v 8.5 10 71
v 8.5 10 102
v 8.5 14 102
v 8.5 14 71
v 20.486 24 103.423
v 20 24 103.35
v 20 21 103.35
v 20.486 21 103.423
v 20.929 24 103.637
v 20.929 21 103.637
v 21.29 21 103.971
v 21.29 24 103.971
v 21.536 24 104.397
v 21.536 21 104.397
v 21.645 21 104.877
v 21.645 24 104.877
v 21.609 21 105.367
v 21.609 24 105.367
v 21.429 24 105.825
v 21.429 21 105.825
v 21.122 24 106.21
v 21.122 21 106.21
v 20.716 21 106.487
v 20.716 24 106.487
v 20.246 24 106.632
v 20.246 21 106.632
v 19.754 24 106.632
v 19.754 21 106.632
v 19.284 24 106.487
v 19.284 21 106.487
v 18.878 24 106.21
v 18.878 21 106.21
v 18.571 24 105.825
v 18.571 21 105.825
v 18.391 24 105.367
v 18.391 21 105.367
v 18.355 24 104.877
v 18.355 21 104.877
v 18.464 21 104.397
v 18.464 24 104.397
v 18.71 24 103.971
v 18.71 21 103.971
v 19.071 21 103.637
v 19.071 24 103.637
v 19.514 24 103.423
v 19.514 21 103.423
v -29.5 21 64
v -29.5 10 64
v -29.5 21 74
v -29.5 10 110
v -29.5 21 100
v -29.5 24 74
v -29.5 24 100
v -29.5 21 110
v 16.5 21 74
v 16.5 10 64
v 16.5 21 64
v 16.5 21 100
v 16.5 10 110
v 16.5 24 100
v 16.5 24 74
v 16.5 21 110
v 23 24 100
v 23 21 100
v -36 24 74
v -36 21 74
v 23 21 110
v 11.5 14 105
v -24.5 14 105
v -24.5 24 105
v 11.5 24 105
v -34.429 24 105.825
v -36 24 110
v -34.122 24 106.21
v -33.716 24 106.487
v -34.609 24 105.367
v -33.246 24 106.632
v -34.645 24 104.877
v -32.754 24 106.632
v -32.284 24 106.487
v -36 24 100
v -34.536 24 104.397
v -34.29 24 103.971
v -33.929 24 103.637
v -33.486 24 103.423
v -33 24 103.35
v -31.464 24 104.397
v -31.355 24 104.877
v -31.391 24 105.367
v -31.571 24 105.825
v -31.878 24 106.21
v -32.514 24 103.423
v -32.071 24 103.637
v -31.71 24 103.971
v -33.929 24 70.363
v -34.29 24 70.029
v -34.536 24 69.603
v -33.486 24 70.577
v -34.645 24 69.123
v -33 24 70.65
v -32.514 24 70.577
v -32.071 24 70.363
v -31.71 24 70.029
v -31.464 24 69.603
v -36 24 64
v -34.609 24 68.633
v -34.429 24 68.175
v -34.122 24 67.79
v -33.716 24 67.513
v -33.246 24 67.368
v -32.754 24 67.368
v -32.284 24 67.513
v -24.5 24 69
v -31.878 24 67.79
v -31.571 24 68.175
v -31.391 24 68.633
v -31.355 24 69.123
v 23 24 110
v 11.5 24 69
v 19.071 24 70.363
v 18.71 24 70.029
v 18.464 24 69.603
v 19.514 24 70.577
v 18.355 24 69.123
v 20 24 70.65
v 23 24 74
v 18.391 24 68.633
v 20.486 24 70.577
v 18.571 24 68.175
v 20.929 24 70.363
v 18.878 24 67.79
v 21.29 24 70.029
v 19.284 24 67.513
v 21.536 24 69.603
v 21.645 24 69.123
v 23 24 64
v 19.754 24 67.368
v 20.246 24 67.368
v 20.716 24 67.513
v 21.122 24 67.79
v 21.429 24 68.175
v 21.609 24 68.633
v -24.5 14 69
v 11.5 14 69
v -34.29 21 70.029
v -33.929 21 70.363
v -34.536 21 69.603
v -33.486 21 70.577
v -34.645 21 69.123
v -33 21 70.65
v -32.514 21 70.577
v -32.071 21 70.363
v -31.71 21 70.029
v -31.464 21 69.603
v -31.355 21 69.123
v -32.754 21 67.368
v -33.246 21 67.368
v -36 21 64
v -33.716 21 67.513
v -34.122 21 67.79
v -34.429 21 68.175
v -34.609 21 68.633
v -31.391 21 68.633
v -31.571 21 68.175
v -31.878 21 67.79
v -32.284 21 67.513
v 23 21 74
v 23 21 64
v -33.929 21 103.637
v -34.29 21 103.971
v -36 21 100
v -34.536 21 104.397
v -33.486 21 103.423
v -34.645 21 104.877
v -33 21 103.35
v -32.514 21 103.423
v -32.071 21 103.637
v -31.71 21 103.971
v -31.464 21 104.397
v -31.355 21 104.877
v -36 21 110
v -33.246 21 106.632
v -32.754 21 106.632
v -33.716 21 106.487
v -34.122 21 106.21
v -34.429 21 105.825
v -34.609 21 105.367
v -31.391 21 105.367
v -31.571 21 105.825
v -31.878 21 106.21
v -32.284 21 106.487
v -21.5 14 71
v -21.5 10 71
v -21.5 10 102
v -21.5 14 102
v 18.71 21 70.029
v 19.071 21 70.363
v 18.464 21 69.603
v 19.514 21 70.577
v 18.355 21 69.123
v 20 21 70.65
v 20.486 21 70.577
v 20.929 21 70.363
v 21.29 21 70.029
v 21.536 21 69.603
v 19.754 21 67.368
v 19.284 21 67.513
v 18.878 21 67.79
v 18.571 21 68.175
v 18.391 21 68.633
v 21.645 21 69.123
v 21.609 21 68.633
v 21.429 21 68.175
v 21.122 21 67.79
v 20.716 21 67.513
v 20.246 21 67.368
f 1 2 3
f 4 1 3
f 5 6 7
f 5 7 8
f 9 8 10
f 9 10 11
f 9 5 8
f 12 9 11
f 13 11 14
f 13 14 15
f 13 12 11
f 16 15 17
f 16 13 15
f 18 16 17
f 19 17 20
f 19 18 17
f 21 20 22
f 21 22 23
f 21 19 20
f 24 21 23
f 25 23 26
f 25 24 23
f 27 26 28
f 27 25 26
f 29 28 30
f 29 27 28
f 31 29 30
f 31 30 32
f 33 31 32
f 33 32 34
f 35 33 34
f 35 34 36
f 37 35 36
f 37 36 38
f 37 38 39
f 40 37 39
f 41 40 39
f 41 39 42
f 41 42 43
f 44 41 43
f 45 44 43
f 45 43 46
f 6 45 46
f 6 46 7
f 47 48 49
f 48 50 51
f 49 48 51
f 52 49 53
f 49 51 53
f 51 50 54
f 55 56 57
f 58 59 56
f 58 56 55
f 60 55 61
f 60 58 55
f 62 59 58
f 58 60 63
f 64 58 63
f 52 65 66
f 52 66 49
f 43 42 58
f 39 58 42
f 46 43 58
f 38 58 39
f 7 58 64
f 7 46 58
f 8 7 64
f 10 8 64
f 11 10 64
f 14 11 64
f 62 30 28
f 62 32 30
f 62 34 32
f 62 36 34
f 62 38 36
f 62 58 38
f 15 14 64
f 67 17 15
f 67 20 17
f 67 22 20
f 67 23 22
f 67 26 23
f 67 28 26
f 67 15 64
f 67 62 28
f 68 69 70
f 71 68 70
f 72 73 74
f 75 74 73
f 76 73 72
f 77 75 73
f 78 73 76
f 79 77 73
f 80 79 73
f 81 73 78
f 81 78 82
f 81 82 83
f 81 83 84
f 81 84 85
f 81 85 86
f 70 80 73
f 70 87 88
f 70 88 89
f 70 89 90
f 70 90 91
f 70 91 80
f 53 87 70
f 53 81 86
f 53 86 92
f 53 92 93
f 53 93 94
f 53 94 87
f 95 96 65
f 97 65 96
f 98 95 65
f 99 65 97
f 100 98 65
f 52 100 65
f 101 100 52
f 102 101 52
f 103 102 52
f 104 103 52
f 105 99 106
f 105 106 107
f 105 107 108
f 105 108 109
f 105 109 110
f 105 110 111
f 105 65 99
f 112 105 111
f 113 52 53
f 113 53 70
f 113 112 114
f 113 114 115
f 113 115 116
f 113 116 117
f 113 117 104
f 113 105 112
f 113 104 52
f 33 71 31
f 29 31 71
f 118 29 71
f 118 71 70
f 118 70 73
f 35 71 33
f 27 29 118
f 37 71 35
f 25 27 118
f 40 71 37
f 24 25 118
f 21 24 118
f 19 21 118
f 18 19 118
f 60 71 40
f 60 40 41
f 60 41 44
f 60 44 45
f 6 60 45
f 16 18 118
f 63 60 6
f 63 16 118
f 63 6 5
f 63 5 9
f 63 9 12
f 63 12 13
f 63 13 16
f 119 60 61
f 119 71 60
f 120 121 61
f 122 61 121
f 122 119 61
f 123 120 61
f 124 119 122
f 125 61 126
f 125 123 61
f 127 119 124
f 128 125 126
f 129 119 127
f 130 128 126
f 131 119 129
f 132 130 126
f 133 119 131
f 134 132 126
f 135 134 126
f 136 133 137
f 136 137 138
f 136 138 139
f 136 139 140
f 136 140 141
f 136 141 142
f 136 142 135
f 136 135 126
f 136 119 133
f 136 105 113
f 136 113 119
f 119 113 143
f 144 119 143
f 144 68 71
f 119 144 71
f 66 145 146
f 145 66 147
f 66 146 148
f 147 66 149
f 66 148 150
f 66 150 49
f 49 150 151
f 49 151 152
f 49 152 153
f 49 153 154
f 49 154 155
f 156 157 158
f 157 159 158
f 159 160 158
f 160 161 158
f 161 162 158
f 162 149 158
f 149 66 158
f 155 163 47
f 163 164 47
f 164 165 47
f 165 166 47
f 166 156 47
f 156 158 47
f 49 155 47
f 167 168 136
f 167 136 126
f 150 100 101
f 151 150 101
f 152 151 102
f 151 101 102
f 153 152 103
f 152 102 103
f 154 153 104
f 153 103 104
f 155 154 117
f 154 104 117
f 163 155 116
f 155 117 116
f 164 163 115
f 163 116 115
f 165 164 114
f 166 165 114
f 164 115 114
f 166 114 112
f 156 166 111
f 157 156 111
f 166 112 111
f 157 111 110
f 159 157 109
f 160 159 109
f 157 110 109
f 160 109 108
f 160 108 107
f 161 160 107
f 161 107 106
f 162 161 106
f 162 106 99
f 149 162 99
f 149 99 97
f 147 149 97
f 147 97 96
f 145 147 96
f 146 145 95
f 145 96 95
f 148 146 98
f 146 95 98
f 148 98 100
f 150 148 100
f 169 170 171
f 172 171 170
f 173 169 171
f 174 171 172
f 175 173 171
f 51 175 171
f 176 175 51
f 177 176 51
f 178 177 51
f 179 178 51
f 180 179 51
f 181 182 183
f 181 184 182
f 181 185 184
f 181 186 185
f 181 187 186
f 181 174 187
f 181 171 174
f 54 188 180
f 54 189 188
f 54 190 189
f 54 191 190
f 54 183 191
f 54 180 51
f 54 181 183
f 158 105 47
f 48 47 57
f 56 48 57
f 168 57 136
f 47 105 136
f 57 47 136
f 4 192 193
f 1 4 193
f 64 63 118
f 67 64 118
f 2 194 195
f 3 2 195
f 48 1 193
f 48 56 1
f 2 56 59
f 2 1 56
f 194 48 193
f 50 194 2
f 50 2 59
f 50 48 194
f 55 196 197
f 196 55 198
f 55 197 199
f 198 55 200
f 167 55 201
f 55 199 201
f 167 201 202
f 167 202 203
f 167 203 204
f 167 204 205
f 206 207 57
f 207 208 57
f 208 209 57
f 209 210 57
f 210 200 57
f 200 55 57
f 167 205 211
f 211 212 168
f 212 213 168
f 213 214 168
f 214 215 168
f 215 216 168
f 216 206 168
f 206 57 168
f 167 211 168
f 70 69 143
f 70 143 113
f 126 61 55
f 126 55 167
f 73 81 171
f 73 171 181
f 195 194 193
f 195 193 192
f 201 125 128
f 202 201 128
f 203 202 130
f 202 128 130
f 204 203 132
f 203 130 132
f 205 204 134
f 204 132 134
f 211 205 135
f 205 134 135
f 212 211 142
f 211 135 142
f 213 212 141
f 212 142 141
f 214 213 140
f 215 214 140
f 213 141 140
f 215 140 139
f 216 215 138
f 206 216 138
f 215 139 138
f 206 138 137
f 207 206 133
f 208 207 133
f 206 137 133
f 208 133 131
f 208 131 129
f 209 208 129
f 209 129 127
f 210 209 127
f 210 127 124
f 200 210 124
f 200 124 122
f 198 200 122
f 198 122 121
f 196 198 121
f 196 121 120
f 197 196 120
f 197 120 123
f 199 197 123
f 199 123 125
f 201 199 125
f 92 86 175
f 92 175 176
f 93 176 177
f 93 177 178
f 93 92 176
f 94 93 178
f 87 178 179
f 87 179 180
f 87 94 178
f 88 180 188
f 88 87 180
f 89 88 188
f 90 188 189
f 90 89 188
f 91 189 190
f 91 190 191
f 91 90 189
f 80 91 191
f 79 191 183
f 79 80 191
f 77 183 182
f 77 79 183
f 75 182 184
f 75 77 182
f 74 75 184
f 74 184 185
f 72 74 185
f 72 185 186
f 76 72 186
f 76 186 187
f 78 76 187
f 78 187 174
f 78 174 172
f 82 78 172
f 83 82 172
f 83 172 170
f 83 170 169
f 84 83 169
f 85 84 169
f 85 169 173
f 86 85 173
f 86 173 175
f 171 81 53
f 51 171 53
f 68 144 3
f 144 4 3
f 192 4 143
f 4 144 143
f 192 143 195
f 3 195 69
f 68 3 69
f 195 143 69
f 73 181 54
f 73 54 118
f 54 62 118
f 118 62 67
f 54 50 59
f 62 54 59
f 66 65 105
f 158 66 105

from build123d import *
from build123d.topology import SkipClean

# Parameters (mm, degrees)
SKETCH_1_W                 = 21
SKETCH_1_H                 = 20
EXTRUDE_1_DEPTH            = 4
SKETCH_2_R                 = 1.65
CUT_EXTRUDE_1_DEPTH        = 4
FILLET_1_R                 = 5
SKETCH_4_W                 = 44
SKETCH_4_H                 = 3
EXTRUDE_2_DEPTH            = 7
EXTRUDE_3_DEPTH            = 110
SKETCH_7_R                 = 1.5
CUT_EXTRUDE_3_DEPTH        = 93
CUT_EXTRUDE_4_DEPTH        = 93
SKETCH_18_W                = 8.046739473
SKETCH_18_H                = 3.477045647
CUT_EXTRUDE_5_DEPTH        = 10
EXTRUDE_START              = 1
SKETCH_21_R                = 1.5
EXTRUDE_4_DEPTH            = 1
SKETCH_27_W                = 38
SKETCH_27_H                = 4
EXTRUDE_9_DEPTH            = 1
FILLET_4_R                 = 0.5
EXTRUDE_START_2            = -4
SKETCH_28_R                = 1.5
EXTRUDE_10_DEPTH           = 4
SKETCH_30_W                = 6
SKETCH_30_H                = 110.5
EXTRUDE_11_DEPTH           = 4
SKETCH_31_W                = 50
SKETCH_31_H                = 4
CUT_EXTRUDE_6_DEPTH        = 5
SKETCH_32_W                = 30
SKETCH_32_H                = 31
CUT_EXTRUDE_7_DEPTH        = 15
SKETCH_33_W                = 23.953260528
SKETCH_33_H                = 6
EXTRUDE_12_DEPTH           = 4
SKETCH_34_W                = 46
SKETCH_34_H                = 46
SKETCH_34_W_2              = 36
SKETCH_34_H_2              = 36
EXTRUDE_1_2_DEPTH          = 10
SKETCH_36_W                = 6
SKETCH_36_H                = 6
EXTRUDE_13_DEPTH           = 4
SKETCH_37_R                = 1.7
CUT_EXTRUDE_8_DEPTH        = 10
FILLET_6_R                 = 1
SKETCH_38_W                = 10
SKETCH_38_H                = 5
CUT_EXTRUDE_9_DEPTH        = 10
SKETCH_39_W                = 7.314348503
SKETCH_39_H                = 1
SKETCH_39_W_2              = 6.638912025
EXTRUDE_14_DEPTH           = 4
SKETCH_40_W                = 10
SKETCH_40_H                = 1
SKETCH_40_H_2              = 4
EXTRUDE_15_DEPTH           = 14
SPLIT_START                = -29.5
SPLIT_BODIES_2_DEPTH       = 46
SPLIT_BODIES_2_2_DEPTH     = 5
SPLIT_START_2              = 11.5
SPLIT_BODIES_2_3_DEPTH     = 5
SPLIT_START_3              = -24.5
SPLIT_BODIES_2_4_OUTLINE_W = 4
SPLIT_BODIES_2_4_OUTLINE_H = 31
SPLIT_BODIES_2_4_DEPTH     = 3
SPLIT_START_4              = 8.5
SPLIT_BODIES_2_5_OUTLINE_W = 4
SPLIT_BODIES_2_5_OUTLINE_H = 31
SPLIT_BODIES_2_5_DEPTH     = 3
SPLIT_START_5              = -37.5
SPLIT_BODIES_2_6_OUTLINE_W = 14
SPLIT_BODIES_2_6_OUTLINE_H = 46
SPLIT_BODIES_2_6_DEPTH     = 54
SPLIT_START_6              = 10
SPLIT_BODIES_2_7_OUTLINE_R = 1.7
SPLIT_BODIES_2_7_DEPTH     = 4
SKETCH_43_W                = 5
SKETCH_43_H                = 5
SKETCH_43_W_2              = 36
EXTRUDE_16_DEPTH           = 3
SKETCH_44_W                = 6.5
SKETCH_44_H                = 10
SKETCH_44_R                = 1.65
EXTRUDE_17_DEPTH           = 3
SPLIT_START_7              = 24
SPLIT_BODIES_4_OUTLINE_W   = 59
SPLIT_BODIES_4_OUTLINE_H   = 10
SPLIT_BODIES_4_OUTLINE_R   = 1.65
SPLIT_BODIES_4_DEPTH       = 3
SPLIT_BODIES_4_2_OUTLINE_W = 59
SPLIT_BODIES_4_2_OUTLINE_H = 10
SPLIT_BODIES_4_2_OUTLINE_R = 1.65
SPLIT_BODIES_4_2_DEPTH     = 3
SPLIT_BODIES_4_3_OUTLINE_W = 59
SPLIT_BODIES_4_3_OUTLINE_H = 10
SPLIT_BODIES_4_3_OUTLINE_R = 1.65
SPLIT_BODIES_4_3_DEPTH     = 3


# Read off the part's stored shape, not the designer's step: 分割1, 分割2, 分割4
with BuildPart() as part:
    # 草图1 → Extrude 1 (new body)
    with BuildSketch(Plane.XY):
        Rectangle(SKETCH_1_W, SKETCH_1_H)
    extrude(amount=EXTRUDE_1_DEPTH)

    # 草图2 → 切除-拉伸1 (cut)
    with BuildSketch(Plane.XY.offset(4)):
        with Locations((-5, 4)):
            Circle(SKETCH_2_R)
        with Locations((5, 4)):
            Circle(SKETCH_2_R)
        with Locations((-5, -4)):
            Circle(SKETCH_2_R)
        with Locations((5, -4)):
            Circle(SKETCH_2_R)
    extrude(amount=-CUT_EXTRUDE_1_DEPTH, mode=Mode.SUBTRACT)

    # 圆角1
    fillet_1_edges = [part.edges().sort_by_distance(p)[0] for p in [
        (10.5, -10, 2),
        (-10.5, -10, 2),
    ]]
    fillet(fillet_1_edges, radius=FILLET_1_R)

    # 草图4 → 凸台-拉伸2 (add)
    with BuildSketch(Plane.XY.offset(4)):
        with Locations((-6.5, 11.5)):
            Rectangle(SKETCH_4_W, SKETCH_4_H)
    extrude(amount=-EXTRUDE_2_DEPTH)

    # 草图5 → 凸台-拉伸3 (add)
    with BuildSketch(Plane.XY.offset(4)):
        Polygon((-6.5, 13), (12.5, 13), (12.5, 10), (-25.5, 10), (-25.5, 13), align=None)
    extrude(amount=EXTRUDE_3_DEPTH)

    # 草图7 → 切除-拉伸3 (cut)
    with BuildSketch(Plane(origin=(0, 13, 0), x_dir=(1, 0, 0), z_dir=(0, 1, 0))):
        with Locations(Location((8.232, -104.79, 0), (0, 0, 270))):
            Circle(SKETCH_7_R)
        with Locations(Location((-21.232, -104.79, 0), (0, 0, 270))):
            Circle(SKETCH_7_R)
        with BuildLine():
            Line((5.476630264, -60.258900788), (5.476630264, -85.258900788))
            Line((5.476630264, -85.258900788), (5.476630264, -111))
            Line((5.476630264, -111), (-6.5, -111))
            Line((-6.5, -111), (-18.476630264, -111))
            Line((-18.476630264, -111), (-18.476630264, -85.258900788))
            Line((-18.476630264, -85.258900788), (-18.476630264, -60.258900788))
            ThreePointArc((-18.476630264, -60.258900788), (-6.5, -48.282270524), (5.476630264, -60.258900788))
        make_face()
    extrude(amount=-CUT_EXTRUDE_3_DEPTH, mode=Mode.SUBTRACT)

    # 草图12 → 切除-拉伸4 (cut)
    with BuildSketch(Plane(origin=(0, 13, 0), x_dir=(1, 0, 0), z_dir=(0, 1, 0))):
        with BuildLine():
            Line((-16.5, -11.5), (3.5, -11.5))
            ThreePointArc((3.5, -11.5), (6, -14), (3.5, -16.5))
            Line((3.5, -16.5), (-16.5, -16.5))
            ThreePointArc((-16.5, -16.5), (-19, -14), (-16.5, -11.5))
        make_face()
        with BuildLine():
            Line((-16.5, -24), (3.5, -24))
            ThreePointArc((3.5, -24), (6, -26.5), (3.5, -29))
            Line((3.5, -29), (-16.5, -29))
            ThreePointArc((-16.5, -29), (-19, -26.5), (-16.5, -24))
        make_face()
        with BuildLine():
            Line((-16.5, -34.5), (3.5, -34.5))
            ThreePointArc((3.5, -34.5), (6, -37), (3.5, -39.5))
            Line((3.5, -39.5), (-16.5, -39.5))
            ThreePointArc((-16.5, -39.5), (-19, -37), (-16.5, -34.5))
        make_face()
    extrude(amount=-CUT_EXTRUDE_4_DEPTH, mode=Mode.SUBTRACT)

    # 草图18 → 切除-拉伸5 (cut)
    with BuildSketch(Plane(origin=(0, 13, 0), x_dir=(1, 0, 0), z_dir=(0, 1, 0))):
        with Locations((5.476630263, -99.520878329)):
            Rectangle(SKETCH_18_W, SKETCH_18_H)
        with Locations((-18.476630263, -99.520878329)):
            Rectangle(SKETCH_18_W, SKETCH_18_H)
    extrude(amount=-CUT_EXTRUDE_5_DEPTH, mode=Mode.SUBTRACT)

    # 草图21 → 凸台-拉伸4 (add)
    with BuildSketch(Plane(origin=(0, 13, 0), x_dir=(1, 0, 0), z_dir=(0, 1, 0)).offset(EXTRUDE_START)):
        Polygon((12.5, -4), (15.5, -4), (15.5, 3), (-28.5, 3), (-28.5, -4), (-25.5, -4), (-25.5, -114), (12.5, -114), align=None)
        with Locations(Location((8.232, -104.79, 0), (0, 0, 270))):
            Circle(SKETCH_21_R, mode=Mode.SUBTRACT)
        with Locations(Location((-21.232, -104.79, 0), (0, 0, 270))):
            Circle(SKETCH_21_R, mode=Mode.SUBTRACT)
        with BuildLine():
            Line((9.5, -97.782355505), (5.476630264, -97.782355505))
            Line((5.476630264, -97.782355505), (5.476630264, -60.258900788))
            ThreePointArc((5.476630264, -60.258900788), (-6.5, -48.282270524), (-18.476630264, -60.258900788))
            Line((-18.476630264, -60.258900788), (-18.476630264, -97.782355505))
            Line((-18.476630264, -97.782355505), (-22.5, -97.782355505))
            Line((-22.5, -97.782355505), (-22.5, -101.259401152))
            Line((-22.5, -101.259401152), (-18.476630264, -101.259401152))
            Line((-18.476630264, -101.259401152), (-18.476630264, -111))
            Line((-18.476630264, -111), (5.476630264, -111))
            Line((5.476630264, -111), (5.476630264, -101.259401152))
            Line((5.476630264, -101.259401152), (9.5, -101.259401152))
            Line((9.5, -101.259401152), (9.5, -97.782355505))
        make_face(mode=Mode.SUBTRACT)
        with BuildLine():
            Line((-16.5, -39.5), (3.5, -39.5))
            ThreePointArc((3.5, -39.5), (6, -37), (3.5, -34.5))
            Line((3.5, -34.5), (-16.5, -34.5))
            ThreePointArc((-16.5, -34.5), (-19, -37), (-16.5, -39.5))
        make_face(mode=Mode.SUBTRACT)
        with BuildLine():
            Line((-16.5, -29), (3.5, -29))
            ThreePointArc((3.5, -29), (6, -26.5), (3.5, -24))
            Line((3.5, -24), (-16.5, -24))
            ThreePointArc((-16.5, -24), (-19, -26.5), (-16.5, -29))
        make_face(mode=Mode.SUBTRACT)
        with BuildLine():
            Line((-16.5, -16.5), (3.5, -16.5))
            ThreePointArc((3.5, -16.5), (6, -14), (3.5, -11.5))
            Line((3.5, -11.5), (-16.5, -11.5))
            ThreePointArc((-16.5, -11.5), (-19, -14), (-16.5, -16.5))
        make_face(mode=Mode.SUBTRACT)
    extrude(amount=-EXTRUDE_4_DEPTH)

    # 草图27 → 凸台-拉伸9 (add)
    with BuildSketch(Plane.XY.offset(114)):
        with Locations((-6.5, 12)):
            Rectangle(SKETCH_27_W, SKETCH_27_H)
    extrude(amount=EXTRUDE_9_DEPTH)

    # 圆角4
    fillet_4_edges = [part.edges().sort_by_distance(p)[0] for p in [
        (-25.5, 12, 115),
        (12.5, 12, 115),
    ]]
    fillet(fillet_4_edges, radius=FILLET_4_R)

    # 草图28 → 凸台-拉伸10 (add)
    with BuildSketch(Plane.XZ.offset(-10).offset(EXTRUDE_START_2)):
        with Locations((-21.232, 104.79)):
            Circle(SKETCH_28_R)
        with Locations((8.232, 104.79)):
            Circle(SKETCH_28_R)
        Polygon((-18.476630264, 111), (5.476630264, 111), (5.476630264, 101.259401152), (9.5, 101.259401152), (9.5, 97.782355505), (5.476630264, 97.782355505), (5.476630264, 75), (-18.476630264, 75), (-18.476630264, 97.782355505), (-22.5, 97.782355505), (-22.5, 101.259401152), (-18.476630264, 101.259401152), align=None)
    extrude(amount=EXTRUDE_10_DEPTH)

    # 草图30 → 凸台-拉伸11 (add)
    with BuildSketch(Plane(origin=(0, 14, 0), x_dir=(1, 0, 0), z_dir=(0, 1, 0))):
        with Locations((-28.5, -59.25)):
            Rectangle(SKETCH_30_W, SKETCH_30_H)
        with Locations((15.5, -59.25)):
            Rectangle(SKETCH_30_W, SKETCH_30_H)
    extrude(amount=-EXTRUDE_11_DEPTH)

    # 草图31 → 切除-拉伸6 (cut)
    with BuildSketch(Plane.XY.offset(115)):
        with Locations((-6.5, 12)):
            Rectangle(SKETCH_31_W, SKETCH_31_H)
    extrude(amount=-CUT_EXTRUDE_6_DEPTH, mode=Mode.SUBTRACT)

    # 草图32 → 切除-拉伸7 (cut)
    with BuildSketch(Plane(origin=(0, 14, 0), x_dir=(1, 0, 0), z_dir=(0, 1, 0))):
        with Locations((-6.5, -86.5)):
            Rectangle(SKETCH_32_W, SKETCH_32_H)
    extrude(amount=-CUT_EXTRUDE_7_DEPTH, mode=Mode.SUBTRACT)

    # 草图33 → 凸台-拉伸12 (add)
    with BuildSketch(Plane(origin=(0, 14, 0), x_dir=(1, 0, 0), z_dir=(0, 1, 0))):
        with Locations((-6.5, -68)):
            Rectangle(SKETCH_33_W, SKETCH_33_H)
    extrude(amount=-EXTRUDE_12_DEPTH)

    # 草图34 → Extrude 1 2 (add)
    with BuildSketch(Plane(origin=(0, 14, 0), x_dir=(1, 0, 0), z_dir=(0, 1, 0))):
        with Locations((-6.5, -87)):
            Rectangle(SKETCH_34_W, SKETCH_34_H)
        with Locations((-6.5, -87)):
            Rectangle(SKETCH_34_W_2, SKETCH_34_H_2, mode=Mode.SUBTRACT)
    extrude(amount=EXTRUDE_1_2_DEPTH)

    # 草图36 → 凸台-拉伸13 (add)
    with BuildSketch(Plane(origin=(0, 14, 0), x_dir=(1, 0, 0), z_dir=(0, 1, 0))):
        with Locations((21.5, -76)):
            Rectangle(SKETCH_36_W, SKETCH_36_H)
        with Locations((21.5, -97)):
            Rectangle(SKETCH_36_W, SKETCH_36_H)
        with Locations((-34.5, -97)):
            Rectangle(SKETCH_36_W, SKETCH_36_H)
        with Locations((-34.5, -76)):
            Rectangle(SKETCH_36_W, SKETCH_36_H)
    extrude(amount=-EXTRUDE_13_DEPTH)

    # 草图37 → 切除-拉伸8 (cut)
    with BuildSketch(Plane(origin=(0, 14, 0), x_dir=(1, 0, 0), z_dir=(0, 1, 0))):
        with Locations(Location((21.5, -76, 0), (0, 0, 270))):
            Circle(SKETCH_37_R)
        with Locations(Location((21.5, -97, 0), (0, 0, 270))):
            Circle(SKETCH_37_R)
        with Locations(Location((-34.5, -76, 0), (0, 0, 270))):
            Circle(SKETCH_37_R)
        with Locations(Location((-34.5, -97, 0), (0, 0, 270))):
            Circle(SKETCH_37_R)
    extrude(amount=-CUT_EXTRUDE_8_DEPTH, mode=Mode.SUBTRACT)

    # 圆角6
    fillet_6_edges = [part.edges().sort_by_distance(p)[0] for p in [
        (24.5, 12, 79),
        (24.5, 12, 73),
        (24.5, 12, 100),
        (24.5, 12, 94),
        (-37.5, 12, 100),
        (-37.5, 12, 94),
        (-37.5, 12, 79),
        (-37.5, 12, 73),
    ]]
    fillet(fillet_6_edges, radius=FILLET_6_R)

    # 草图38 → 切除-拉伸9 (cut)
    with BuildSketch(Plane(origin=(0, 24, 0), x_dir=(1, 0, 0), z_dir=(0, 1, 0))):
        with Locations((-6.162281761, -66.5)):
            Rectangle(SKETCH_38_W, SKETCH_38_H)
    extrude(amount=-CUT_EXTRUDE_9_DEPTH, mode=Mode.SUBTRACT)


with BuildPart() as body_2:
    # Split Bodies 1: the piece on the far side of the plane
    add(part.part)
    split(bisect_by=Plane.XY.offset(64), keep=Keep.BOTTOM)


with BuildPart() as part_1:
    add(part.part)

    # Split Bodies 1
    split(bisect_by=Plane.XY.offset(64), keep=Keep.TOP)

    # 草图39 → 凸台-拉伸14 (add)
    with BuildSketch(Plane.XZ.offset(-14)):
        with Locations((-14.819456013, 64.5)):
            Rectangle(SKETCH_39_W, SKETCH_39_H)
        with Locations((2.157174252, 64.5)):
            Rectangle(SKETCH_39_W_2, SKETCH_39_H)
    extrude(amount=EXTRUDE_14_DEPTH)

    # 草图40 → 凸台-拉伸15 (add)
    with BuildSketch(Plane.XZ.offset(-10)):
        with Locations((-6.162281761, 64.5)):
            Rectangle(SKETCH_40_W, SKETCH_40_H)
        with Locations((-6.162281761, 67)):
            Rectangle(SKETCH_40_W, SKETCH_40_H_2)
    extrude(amount=-EXTRUDE_15_DEPTH)

    # Split Bodies 2 6 outline → Split Bodies 2 6 (cut)
    with BuildSketch(Plane.YZ.offset(SPLIT_START_5)):
        with Locations((17, 87)):
            Rectangle(SPLIT_BODIES_2_6_OUTLINE_W, SPLIT_BODIES_2_6_OUTLINE_H)
    extrude(amount=SPLIT_BODIES_2_6_DEPTH, mode=Mode.SUBTRACT)


with BuildPart() as body_2_2:
    # Split Bodies 2 outline → Split Bodies 2 (new body)
    with BuildSketch(Plane.YZ.offset(SPLIT_START)):
        Polygon((24, 69), (14, 69), (14, 71), (10, 71), (10, 64), (24, 64), align=None)
        Polygon((10, 102), (14, 102), (14, 105), (24, 105), (24, 110), (10, 110), align=None)
    extrude(amount=SPLIT_BODIES_2_DEPTH)

    # Split Bodies 2 2 outline → Split Bodies 2 2 (add)
    with BuildSketch(Plane.YZ.offset(SPLIT_START)):
        Polygon((14, 71), (14, 69), (24, 69), (24, 105), (14, 105), (14, 102), (10, 102), (10, 71), align=None)
    extrude(amount=SPLIT_BODIES_2_2_DEPTH)

    # Split Bodies 2 3 outline → Split Bodies 2 3 (add)
    with BuildSketch(Plane.YZ.offset(SPLIT_START_2)):
        Polygon((14, 71), (14, 69), (24, 69), (24, 105), (14, 105), (14, 102), (10, 102), (10, 71), align=None)
    extrude(amount=SPLIT_BODIES_2_3_DEPTH)

    # Split Bodies 2 4 outline → Split Bodies 2 4 (add)
    with BuildSketch(Plane.YZ.offset(SPLIT_START_3)):
        with Locations((12, 86.5)):
            Rectangle(SPLIT_BODIES_2_4_OUTLINE_W, SPLIT_BODIES_2_4_OUTLINE_H)
    extrude(amount=SPLIT_BODIES_2_4_DEPTH)

    # Split Bodies 2 5 outline → Split Bodies 2 5 (add)
    with BuildSketch(Plane.YZ.offset(SPLIT_START_4)):
        with Locations((12, 86.5)):
            Rectangle(SPLIT_BODIES_2_5_OUTLINE_W, SPLIT_BODIES_2_5_OUTLINE_H)
    extrude(amount=SPLIT_BODIES_2_5_DEPTH)

    # 草图43 → 凸台-拉伸16 (add)
    with BuildSketch(Plane(origin=(0, 24, 0), x_dir=(1, 0, 0), z_dir=(0, 1, 0))):
        with BuildLine():
            Line((-36, -100), (-36, -105))
            Line((-36, -105), (-34.65, -105))
            ThreePointArc((-34.65, -105), (-33, -103.35), (-31.35, -105))
            Line((-31.35, -105), (-29.5, -105))
            Line((-29.5, -105), (-29.5, -100))
            Line((-29.5, -100), (-36, -100))
        make_face()
        with BuildLine():
            Line((-36, -105), (-36, -110))
            Line((-36, -110), (-29.5, -110))
            Line((-29.5, -110), (-29.5, -105))
            Line((-29.5, -105), (-31.35, -105))
            ThreePointArc((-31.35, -105), (-33, -106.65), (-34.65, -105))
            Line((-34.65, -105), (-36, -105))
        make_face()
        Polygon((-29.5, -105), (-29.5, -110), (16.5, -110), (16.5, -105), (11.5, -105), (-24.5, -105), align=None)
        with Locations((-27, -102.5)):
            Rectangle(SKETCH_43_W, SKETCH_43_H)
        with Locations((-6.5, -102.5)):
            Rectangle(SKETCH_43_W_2, SKETCH_43_H)
        with Locations((14, -102.5)):
            Rectangle(SKETCH_43_W, SKETCH_43_H)
        with BuildLine():
            Line((16.5, -105), (16.5, -110))
            Line((16.5, -110), (23, -110))
            Line((23, -110), (23, -105))
            Line((23, -105), (21.65, -105))
            ThreePointArc((21.65, -105), (20, -106.65), (18.35, -105))
            Line((18.35, -105), (16.5, -105))
        make_face()
        with BuildLine():
            Line((16.5, -100), (16.5, -105))
            Line((16.5, -105), (18.35, -105))
            ThreePointArc((18.35, -105), (20, -103.35), (21.65, -105))
            Line((21.65, -105), (23, -105))
            Line((23, -105), (23, -100))
            Line((23, -100), (16.5, -100))
        make_face()
    extrude_16 = extrude(amount=EXTRUDE_16_DEPTH)

    # 草图44 → 凸台-拉伸17 (add)
    # profile 1 of 2: a face of its own
    with SkipClean():  # the faces are left unmerged after this step: merging them gives an invalid solid
        with BuildSketch(Plane.XZ.offset(-24)):
            with Locations((-32.75, 105)):
                Rectangle(SKETCH_44_W, SKETCH_44_H)
            with Locations(Location((-33, 105, 0), (0, 0, 270))):
                Circle(SKETCH_44_R, mode=Mode.SUBTRACT)
        # profile 2 of 2: a face of its own
        with BuildSketch(Plane.XZ.offset(-24)):
            with Locations((19.75, 105)):
                Rectangle(SKETCH_44_W, SKETCH_44_H)
            with Locations(Location((20, 105, 0), (0, 0, 270))):
                Circle(SKETCH_44_R, mode=Mode.SUBTRACT)
        extrude_17 = extrude(amount=EXTRUDE_17_DEPTH)

    # 镜向2: 凸台-拉伸16, 凸台-拉伸17 across plane
    with SkipClean():  # the faces are left unmerged after this step: merging them gives an invalid solid
        add(extrude_16.mirror(Plane(origin=(0, 0, 87), x_dir=(1, 0, 0), z_dir=(0, 0, -1))))
        add(extrude_17.mirror(Plane(origin=(0, 0, 87), x_dir=(1, 0, 0), z_dir=(0, 0, -1))))
    add(body_2_2.part.scale(1), mode=Mode.REPLACE)  # the faces are merged on a copy

    # Split Bodies 4 outline → Split Bodies 4 (cut)
    # profile 1 of 2: a face of its own
    with BuildSketch(Plane(origin=(0, 0, 0), x_dir=(1, 0, 0), z_dir=(0, 1, 0)).offset(SPLIT_START_7)):
        with Locations((-6.5, -69)):
            Rectangle(SPLIT_BODIES_4_OUTLINE_W, SPLIT_BODIES_4_OUTLINE_H)
        with Locations((-33, -69)):
            Circle(SPLIT_BODIES_4_OUTLINE_R, mode=Mode.SUBTRACT)
        with Locations((20, -69)):
            Circle(SPLIT_BODIES_4_OUTLINE_R, mode=Mode.SUBTRACT)
    # profile 2 of 2: a face of its own
    with BuildSketch(Plane(origin=(0, 0, 0), x_dir=(1, 0, 0), z_dir=(0, 1, 0)).offset(SPLIT_START_7)):
        with Locations((-6.5, -105)):
            Rectangle(SPLIT_BODIES_4_OUTLINE_W, SPLIT_BODIES_4_OUTLINE_H)
        with Locations((-33, -105)):
            Circle(SPLIT_BODIES_4_OUTLINE_R, mode=Mode.SUBTRACT)
        with Locations((20, -105)):
            Circle(SPLIT_BODIES_4_OUTLINE_R, mode=Mode.SUBTRACT)
    extrude(amount=SPLIT_BODIES_4_DEPTH, mode=Mode.SUBTRACT)


with BuildPart() as body_3:
    # Split Bodies 2 7 outline → Split Bodies 2 7 (new body)
    with BuildSketch(Plane(origin=(0, 0, 0), x_dir=(1, 0, 0), z_dir=(0, 1, 0)).offset(SPLIT_START_6)):
        with BuildLine():
            Line((-29.5, -110), (-29.5, -64))
            Line((-29.5, -64), (-31.5, -64))
            Line((-31.5, -64), (-31.5, -73))
            Line((-31.5, -73), (-36.5, -73))
            ThreePointArc((-36.5, -73), (-37.207106781, -73.292893219), (-37.5, -74))
            Line((-37.5, -74), (-37.5, -78))
            ThreePointArc((-37.5, -78), (-37.207106781, -78.707106781), (-36.5, -79))
            Line((-36.5, -79), (-31.5, -79))
            Line((-31.5, -79), (-31.5, -94))
            Line((-31.5, -94), (-36.5, -94))
            ThreePointArc((-36.5, -94), (-37.207106781, -94.292893219), (-37.5, -95))
            Line((-37.5, -95), (-37.5, -99))
            ThreePointArc((-37.5, -99), (-37.207106781, -99.707106781), (-36.5, -100))
            Line((-36.5, -100), (-31.5, -100))
            Line((-31.5, -100), (-31.5, -110))
            Line((-31.5, -110), (-29.5, -110))
        make_face()
        with Locations((-34.5, -97)):
            Circle(SPLIT_BODIES_2_7_OUTLINE_R, mode=Mode.SUBTRACT)
        with Locations((-34.5, -76)):
            Circle(SPLIT_BODIES_2_7_OUTLINE_R, mode=Mode.SUBTRACT)
    extrude(amount=SPLIT_BODIES_2_7_DEPTH)


with BuildPart() as body_2_3:
    # Split Bodies 4 2 outline → Split Bodies 4 2 (new body)
    with BuildSketch(Plane(origin=(0, 0, 0), x_dir=(1, 0, 0), z_dir=(0, 1, 0)).offset(SPLIT_START_7)):
        with Locations((-6.5, -105)):
            Rectangle(SPLIT_BODIES_4_2_OUTLINE_W, SPLIT_BODIES_4_2_OUTLINE_H)
        with Locations((-33, -105)):
            Circle(SPLIT_BODIES_4_2_OUTLINE_R, mode=Mode.SUBTRACT)
        with Locations((20, -105)):
            Circle(SPLIT_BODIES_4_2_OUTLINE_R, mode=Mode.SUBTRACT)
    extrude(amount=SPLIT_BODIES_4_2_DEPTH)


with BuildPart() as body_3_2:
    # Split Bodies 4 3 outline → Split Bodies 4 3 (new body)
    with BuildSketch(Plane(origin=(0, 0, 0), x_dir=(1, 0, 0), z_dir=(0, 1, 0)).offset(SPLIT_START_7)):
        with Locations((-6.5, -69)):
            Rectangle(SPLIT_BODIES_4_3_OUTLINE_W, SPLIT_BODIES_4_3_OUTLINE_H)
        with Locations((-33, -69)):
            Circle(SPLIT_BODIES_4_3_OUTLINE_R, mode=Mode.SUBTRACT)
        with Locations((20, -69)):
            Circle(SPLIT_BODIES_4_3_OUTLINE_R, mode=Mode.SUBTRACT)
    extrude(amount=SPLIT_BODIES_4_3_DEPTH)


solid = body_2_2.part
